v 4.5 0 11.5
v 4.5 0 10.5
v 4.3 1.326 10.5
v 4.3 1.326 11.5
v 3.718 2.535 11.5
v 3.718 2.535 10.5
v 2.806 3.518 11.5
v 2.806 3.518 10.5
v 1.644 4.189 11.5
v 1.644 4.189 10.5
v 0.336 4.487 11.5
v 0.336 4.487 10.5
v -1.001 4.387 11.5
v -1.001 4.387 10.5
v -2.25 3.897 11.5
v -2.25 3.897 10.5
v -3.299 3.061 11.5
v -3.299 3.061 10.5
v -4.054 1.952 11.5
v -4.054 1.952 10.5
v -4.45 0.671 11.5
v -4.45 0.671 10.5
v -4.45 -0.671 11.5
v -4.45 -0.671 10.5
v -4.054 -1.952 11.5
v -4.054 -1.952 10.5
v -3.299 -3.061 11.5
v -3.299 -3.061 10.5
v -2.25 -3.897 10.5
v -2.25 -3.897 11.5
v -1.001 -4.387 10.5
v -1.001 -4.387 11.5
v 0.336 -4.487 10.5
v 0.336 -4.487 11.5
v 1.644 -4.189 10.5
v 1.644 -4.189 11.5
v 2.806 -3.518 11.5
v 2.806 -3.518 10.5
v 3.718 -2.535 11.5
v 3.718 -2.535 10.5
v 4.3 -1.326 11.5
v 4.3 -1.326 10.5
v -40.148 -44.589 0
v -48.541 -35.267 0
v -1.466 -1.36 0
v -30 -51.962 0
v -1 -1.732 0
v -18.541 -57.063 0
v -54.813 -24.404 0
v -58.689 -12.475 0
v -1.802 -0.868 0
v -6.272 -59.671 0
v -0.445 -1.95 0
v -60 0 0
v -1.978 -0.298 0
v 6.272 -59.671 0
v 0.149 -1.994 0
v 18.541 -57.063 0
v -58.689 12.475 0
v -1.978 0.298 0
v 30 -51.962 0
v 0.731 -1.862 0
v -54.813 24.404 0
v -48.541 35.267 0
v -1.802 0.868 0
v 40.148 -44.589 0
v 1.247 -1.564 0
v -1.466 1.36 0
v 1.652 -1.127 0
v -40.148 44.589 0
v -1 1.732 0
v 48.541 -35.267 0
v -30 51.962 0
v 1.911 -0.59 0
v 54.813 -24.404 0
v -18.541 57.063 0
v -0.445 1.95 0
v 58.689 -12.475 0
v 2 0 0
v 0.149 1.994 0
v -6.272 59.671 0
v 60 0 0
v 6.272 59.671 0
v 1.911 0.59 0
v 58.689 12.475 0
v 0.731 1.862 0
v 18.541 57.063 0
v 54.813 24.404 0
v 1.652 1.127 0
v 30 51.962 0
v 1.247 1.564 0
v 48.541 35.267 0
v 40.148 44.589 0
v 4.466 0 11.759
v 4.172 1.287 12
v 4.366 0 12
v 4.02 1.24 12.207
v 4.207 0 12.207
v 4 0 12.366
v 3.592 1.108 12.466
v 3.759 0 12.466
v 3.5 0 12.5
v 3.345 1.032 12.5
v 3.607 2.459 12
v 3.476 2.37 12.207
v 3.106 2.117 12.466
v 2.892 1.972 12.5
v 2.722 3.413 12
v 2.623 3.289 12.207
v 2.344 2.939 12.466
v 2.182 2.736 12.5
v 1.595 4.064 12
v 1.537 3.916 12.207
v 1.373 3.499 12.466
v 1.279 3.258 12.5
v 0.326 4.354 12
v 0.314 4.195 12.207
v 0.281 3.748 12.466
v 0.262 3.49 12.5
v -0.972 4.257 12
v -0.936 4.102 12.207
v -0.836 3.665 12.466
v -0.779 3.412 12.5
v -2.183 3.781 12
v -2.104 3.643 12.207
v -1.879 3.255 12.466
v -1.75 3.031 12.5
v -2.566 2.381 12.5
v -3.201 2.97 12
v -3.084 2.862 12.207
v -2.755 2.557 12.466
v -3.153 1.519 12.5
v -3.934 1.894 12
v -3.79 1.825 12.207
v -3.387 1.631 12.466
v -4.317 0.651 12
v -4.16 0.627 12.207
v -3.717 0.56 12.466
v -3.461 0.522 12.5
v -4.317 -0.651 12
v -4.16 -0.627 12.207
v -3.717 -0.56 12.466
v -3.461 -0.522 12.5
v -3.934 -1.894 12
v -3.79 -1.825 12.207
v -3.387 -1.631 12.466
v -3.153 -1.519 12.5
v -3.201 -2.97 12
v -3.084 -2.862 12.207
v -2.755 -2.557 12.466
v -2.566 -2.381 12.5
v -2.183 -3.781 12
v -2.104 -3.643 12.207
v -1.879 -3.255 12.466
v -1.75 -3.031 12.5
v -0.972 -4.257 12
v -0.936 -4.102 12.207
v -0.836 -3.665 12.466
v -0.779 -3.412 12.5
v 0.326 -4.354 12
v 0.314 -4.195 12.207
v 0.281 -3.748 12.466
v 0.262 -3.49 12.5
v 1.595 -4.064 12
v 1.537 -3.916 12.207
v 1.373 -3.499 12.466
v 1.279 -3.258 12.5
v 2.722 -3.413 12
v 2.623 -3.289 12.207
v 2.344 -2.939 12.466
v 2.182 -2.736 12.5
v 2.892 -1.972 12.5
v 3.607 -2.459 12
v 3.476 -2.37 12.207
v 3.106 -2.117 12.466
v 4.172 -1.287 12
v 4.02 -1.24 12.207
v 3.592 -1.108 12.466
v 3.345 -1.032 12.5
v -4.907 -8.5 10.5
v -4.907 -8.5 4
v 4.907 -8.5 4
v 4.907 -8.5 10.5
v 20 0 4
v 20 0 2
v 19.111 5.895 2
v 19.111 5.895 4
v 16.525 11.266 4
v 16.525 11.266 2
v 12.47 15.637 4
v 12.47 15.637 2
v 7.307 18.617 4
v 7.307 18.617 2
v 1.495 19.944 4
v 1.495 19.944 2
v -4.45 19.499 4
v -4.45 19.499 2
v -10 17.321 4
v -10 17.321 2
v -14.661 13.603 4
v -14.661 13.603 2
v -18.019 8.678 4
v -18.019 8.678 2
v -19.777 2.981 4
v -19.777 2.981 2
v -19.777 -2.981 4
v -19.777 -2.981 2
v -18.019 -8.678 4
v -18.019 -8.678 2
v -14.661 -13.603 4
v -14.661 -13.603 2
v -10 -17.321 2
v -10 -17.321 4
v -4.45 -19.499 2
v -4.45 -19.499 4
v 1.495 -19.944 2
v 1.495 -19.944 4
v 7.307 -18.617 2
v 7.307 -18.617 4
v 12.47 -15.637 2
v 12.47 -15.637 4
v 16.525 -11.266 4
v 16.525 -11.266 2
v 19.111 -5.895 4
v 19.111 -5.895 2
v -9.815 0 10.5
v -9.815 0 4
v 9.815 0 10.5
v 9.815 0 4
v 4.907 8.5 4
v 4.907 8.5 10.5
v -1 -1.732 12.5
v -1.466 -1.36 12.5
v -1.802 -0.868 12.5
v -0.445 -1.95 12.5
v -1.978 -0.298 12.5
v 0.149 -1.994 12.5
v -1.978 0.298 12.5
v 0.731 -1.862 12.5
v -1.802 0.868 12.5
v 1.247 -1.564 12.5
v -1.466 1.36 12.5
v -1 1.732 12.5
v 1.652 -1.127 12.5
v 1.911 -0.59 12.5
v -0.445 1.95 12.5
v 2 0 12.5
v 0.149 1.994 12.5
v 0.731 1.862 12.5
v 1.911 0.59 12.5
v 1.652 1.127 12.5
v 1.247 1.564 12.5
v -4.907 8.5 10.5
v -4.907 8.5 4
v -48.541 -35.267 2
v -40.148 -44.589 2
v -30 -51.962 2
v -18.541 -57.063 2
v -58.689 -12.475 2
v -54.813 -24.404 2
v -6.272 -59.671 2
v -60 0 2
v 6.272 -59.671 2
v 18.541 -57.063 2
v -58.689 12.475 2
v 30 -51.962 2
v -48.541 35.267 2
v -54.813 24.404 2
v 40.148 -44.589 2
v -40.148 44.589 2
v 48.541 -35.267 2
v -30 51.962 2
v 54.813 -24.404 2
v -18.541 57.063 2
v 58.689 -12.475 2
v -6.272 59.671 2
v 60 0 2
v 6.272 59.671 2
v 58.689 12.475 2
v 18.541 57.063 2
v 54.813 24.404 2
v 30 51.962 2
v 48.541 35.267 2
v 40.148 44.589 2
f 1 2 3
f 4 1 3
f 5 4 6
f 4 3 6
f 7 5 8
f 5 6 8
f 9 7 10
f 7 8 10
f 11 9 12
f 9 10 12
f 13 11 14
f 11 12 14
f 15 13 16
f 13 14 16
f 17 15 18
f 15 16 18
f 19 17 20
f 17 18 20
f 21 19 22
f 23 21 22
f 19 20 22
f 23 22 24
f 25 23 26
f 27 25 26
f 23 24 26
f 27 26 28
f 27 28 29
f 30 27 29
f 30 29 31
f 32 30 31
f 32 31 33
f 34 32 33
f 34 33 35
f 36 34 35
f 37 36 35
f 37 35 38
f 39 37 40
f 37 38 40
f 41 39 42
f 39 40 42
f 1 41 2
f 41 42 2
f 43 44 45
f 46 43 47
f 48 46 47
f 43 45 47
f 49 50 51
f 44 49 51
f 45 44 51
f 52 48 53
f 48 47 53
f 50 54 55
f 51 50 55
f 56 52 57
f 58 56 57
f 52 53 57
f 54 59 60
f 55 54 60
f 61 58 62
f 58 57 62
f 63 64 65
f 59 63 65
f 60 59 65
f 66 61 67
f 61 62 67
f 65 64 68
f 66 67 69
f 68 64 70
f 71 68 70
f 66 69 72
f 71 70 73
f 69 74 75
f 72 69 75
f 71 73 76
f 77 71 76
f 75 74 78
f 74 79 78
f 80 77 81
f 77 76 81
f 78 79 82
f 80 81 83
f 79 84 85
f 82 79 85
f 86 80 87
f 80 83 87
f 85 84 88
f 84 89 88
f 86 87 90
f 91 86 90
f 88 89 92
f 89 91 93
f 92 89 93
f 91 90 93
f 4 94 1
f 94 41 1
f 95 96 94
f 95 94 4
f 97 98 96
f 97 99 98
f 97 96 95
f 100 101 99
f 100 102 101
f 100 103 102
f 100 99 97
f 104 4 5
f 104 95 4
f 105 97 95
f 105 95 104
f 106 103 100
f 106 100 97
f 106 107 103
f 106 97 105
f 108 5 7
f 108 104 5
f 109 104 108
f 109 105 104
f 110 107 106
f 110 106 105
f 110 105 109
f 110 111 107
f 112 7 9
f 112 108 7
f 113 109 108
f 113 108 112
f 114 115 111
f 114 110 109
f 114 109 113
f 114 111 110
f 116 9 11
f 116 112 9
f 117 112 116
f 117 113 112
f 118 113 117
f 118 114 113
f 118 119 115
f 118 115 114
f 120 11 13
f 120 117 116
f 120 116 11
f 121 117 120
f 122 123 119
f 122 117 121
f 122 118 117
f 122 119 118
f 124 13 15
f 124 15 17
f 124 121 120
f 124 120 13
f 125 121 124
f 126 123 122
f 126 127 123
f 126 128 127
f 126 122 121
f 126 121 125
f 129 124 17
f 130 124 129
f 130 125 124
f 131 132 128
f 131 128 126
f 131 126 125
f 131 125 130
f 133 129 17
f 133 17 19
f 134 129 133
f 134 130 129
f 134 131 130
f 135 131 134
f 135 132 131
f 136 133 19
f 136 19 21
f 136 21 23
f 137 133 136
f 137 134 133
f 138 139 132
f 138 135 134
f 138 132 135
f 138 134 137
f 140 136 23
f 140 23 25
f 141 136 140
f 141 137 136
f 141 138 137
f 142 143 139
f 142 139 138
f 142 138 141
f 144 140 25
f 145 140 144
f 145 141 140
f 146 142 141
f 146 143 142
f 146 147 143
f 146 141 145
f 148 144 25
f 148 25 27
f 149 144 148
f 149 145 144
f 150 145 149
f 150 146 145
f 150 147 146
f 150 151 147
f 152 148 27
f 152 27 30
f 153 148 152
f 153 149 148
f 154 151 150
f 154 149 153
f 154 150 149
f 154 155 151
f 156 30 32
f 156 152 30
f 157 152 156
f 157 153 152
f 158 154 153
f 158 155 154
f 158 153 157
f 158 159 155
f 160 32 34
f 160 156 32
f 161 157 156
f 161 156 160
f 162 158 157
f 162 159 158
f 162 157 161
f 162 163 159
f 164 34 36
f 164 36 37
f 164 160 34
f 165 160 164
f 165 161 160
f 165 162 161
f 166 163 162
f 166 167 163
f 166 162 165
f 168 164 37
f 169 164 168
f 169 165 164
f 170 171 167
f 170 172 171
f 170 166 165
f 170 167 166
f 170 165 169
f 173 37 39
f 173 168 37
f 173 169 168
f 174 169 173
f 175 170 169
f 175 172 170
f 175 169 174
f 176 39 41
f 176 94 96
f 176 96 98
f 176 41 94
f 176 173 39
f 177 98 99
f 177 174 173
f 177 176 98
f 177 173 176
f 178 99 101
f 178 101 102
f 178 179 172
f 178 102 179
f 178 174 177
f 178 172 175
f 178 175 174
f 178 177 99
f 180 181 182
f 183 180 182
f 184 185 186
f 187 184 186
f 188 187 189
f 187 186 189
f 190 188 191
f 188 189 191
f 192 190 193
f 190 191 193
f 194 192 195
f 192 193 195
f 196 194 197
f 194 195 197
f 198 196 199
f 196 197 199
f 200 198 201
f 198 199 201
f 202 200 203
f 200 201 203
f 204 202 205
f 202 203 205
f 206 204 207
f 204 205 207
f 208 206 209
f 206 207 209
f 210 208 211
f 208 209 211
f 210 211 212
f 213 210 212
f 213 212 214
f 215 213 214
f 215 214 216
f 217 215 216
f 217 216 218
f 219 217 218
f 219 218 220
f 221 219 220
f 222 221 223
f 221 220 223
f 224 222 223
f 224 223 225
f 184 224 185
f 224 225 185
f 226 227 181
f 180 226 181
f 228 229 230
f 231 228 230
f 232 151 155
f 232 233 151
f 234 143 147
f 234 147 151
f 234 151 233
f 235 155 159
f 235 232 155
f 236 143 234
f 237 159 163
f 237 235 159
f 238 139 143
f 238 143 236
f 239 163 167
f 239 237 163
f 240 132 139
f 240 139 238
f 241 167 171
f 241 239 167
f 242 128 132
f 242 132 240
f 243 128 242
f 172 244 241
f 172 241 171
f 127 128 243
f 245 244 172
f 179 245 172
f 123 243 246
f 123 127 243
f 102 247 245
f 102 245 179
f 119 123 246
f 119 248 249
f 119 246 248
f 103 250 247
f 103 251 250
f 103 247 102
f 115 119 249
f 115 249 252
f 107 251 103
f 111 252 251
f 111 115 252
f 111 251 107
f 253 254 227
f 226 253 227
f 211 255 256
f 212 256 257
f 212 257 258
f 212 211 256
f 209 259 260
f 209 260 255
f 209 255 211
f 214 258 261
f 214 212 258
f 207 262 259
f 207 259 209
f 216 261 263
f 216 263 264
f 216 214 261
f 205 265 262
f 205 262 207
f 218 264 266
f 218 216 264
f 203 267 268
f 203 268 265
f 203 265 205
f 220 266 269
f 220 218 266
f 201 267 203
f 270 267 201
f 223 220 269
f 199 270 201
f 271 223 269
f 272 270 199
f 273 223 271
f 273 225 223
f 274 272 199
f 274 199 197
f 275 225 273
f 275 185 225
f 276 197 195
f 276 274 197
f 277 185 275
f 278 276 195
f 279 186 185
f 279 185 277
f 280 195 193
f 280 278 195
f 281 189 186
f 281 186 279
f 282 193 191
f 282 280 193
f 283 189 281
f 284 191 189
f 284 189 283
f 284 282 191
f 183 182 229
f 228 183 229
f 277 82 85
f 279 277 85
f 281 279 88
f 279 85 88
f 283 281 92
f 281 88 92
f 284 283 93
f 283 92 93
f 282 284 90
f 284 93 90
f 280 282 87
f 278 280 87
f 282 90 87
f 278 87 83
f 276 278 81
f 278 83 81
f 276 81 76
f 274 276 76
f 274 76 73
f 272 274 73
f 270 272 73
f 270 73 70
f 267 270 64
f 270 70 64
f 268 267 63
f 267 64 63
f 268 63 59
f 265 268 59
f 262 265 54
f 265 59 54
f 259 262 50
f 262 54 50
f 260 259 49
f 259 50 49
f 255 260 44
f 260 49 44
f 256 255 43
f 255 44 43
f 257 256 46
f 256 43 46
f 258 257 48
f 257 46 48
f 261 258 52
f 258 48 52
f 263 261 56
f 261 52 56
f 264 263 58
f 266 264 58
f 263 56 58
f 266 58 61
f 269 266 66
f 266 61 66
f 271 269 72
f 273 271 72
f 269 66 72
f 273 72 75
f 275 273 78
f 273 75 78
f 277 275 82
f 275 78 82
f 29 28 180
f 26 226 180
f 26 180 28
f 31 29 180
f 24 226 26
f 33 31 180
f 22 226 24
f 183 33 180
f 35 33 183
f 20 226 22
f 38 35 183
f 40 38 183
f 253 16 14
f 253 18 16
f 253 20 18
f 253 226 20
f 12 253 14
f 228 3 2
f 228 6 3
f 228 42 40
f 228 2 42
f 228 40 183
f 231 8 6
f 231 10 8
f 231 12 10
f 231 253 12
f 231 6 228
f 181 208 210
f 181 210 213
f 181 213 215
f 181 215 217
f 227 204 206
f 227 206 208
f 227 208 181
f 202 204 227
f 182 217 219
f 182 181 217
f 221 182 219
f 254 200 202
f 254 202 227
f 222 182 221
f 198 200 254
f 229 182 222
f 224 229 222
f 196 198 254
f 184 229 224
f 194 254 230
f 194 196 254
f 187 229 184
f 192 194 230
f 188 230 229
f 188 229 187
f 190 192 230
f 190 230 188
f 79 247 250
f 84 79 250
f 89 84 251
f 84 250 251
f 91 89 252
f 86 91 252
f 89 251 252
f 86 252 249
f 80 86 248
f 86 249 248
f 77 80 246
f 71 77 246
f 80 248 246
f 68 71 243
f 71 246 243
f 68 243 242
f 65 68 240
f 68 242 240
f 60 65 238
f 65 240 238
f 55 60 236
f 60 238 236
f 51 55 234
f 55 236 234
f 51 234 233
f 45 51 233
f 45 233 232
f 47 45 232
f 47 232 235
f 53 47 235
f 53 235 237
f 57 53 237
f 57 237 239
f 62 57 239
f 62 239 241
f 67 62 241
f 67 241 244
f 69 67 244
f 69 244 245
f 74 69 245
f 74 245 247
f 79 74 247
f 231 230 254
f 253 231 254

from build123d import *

# Parameters (mm, degrees)
SKETCH_R     = 60
PAD_DEPTH    = 2
SKETCH001_R  = 20
PAD001_DEPTH = 2
PAD002_DEPTH = 6.5
SKETCH003_R  = 4.5
PAD003_DEPTH = 2
FILLET_R     = 1
SKETCH004_R  = 2
POCKET_DEPTH = 12.501


with BuildPart() as part:
    # Sketch → Pad (new body)
    with BuildSketch(Plane.XY):
        Circle(SKETCH_R)
    extrude(amount=PAD_DEPTH)

    # Sketch001 (on Face3 of Pad) → Pad001 (join)
    with BuildSketch(Plane.XY.offset(2)):
        Circle(SKETCH001_R)
    extrude(amount=PAD001_DEPTH)

    # Sketch002 (on Face5 of Pad001) → Pad002 (join)
    with BuildSketch(Plane.XY.offset(4)):
        Polygon((4.907477, 8.5), (-4.907477, 8.5), (-9.814955, 0), (-4.907477, -8.5), (4.907477, -8.5), (9.814955, 0), align=None)
    extrude(amount=PAD002_DEPTH)

    # Sketch003 (on Face12 of Pad002) → Pad003 (join)
    with BuildSketch(Plane.XY.offset(10.5)):
        Circle(SKETCH003_R)
    extrude(amount=PAD003_DEPTH)

    # Fillet
    fillet_edges = [part.edges().sort_by_distance(p)[0] for p in [
        (-4.5, 0, 12.5),
    ]]
    fillet(fillet_edges, radius=FILLET_R)

    # Sketch004 (on Face4 of Fillet) → Pocket (cut, through all)
    with BuildSketch(Plane.XY.offset(12.5)):
        Circle(SKETCH004_R)
    extrude(amount=-POCKET_DEPTH, mode=Mode.SUBTRACT)


solid = part.part
